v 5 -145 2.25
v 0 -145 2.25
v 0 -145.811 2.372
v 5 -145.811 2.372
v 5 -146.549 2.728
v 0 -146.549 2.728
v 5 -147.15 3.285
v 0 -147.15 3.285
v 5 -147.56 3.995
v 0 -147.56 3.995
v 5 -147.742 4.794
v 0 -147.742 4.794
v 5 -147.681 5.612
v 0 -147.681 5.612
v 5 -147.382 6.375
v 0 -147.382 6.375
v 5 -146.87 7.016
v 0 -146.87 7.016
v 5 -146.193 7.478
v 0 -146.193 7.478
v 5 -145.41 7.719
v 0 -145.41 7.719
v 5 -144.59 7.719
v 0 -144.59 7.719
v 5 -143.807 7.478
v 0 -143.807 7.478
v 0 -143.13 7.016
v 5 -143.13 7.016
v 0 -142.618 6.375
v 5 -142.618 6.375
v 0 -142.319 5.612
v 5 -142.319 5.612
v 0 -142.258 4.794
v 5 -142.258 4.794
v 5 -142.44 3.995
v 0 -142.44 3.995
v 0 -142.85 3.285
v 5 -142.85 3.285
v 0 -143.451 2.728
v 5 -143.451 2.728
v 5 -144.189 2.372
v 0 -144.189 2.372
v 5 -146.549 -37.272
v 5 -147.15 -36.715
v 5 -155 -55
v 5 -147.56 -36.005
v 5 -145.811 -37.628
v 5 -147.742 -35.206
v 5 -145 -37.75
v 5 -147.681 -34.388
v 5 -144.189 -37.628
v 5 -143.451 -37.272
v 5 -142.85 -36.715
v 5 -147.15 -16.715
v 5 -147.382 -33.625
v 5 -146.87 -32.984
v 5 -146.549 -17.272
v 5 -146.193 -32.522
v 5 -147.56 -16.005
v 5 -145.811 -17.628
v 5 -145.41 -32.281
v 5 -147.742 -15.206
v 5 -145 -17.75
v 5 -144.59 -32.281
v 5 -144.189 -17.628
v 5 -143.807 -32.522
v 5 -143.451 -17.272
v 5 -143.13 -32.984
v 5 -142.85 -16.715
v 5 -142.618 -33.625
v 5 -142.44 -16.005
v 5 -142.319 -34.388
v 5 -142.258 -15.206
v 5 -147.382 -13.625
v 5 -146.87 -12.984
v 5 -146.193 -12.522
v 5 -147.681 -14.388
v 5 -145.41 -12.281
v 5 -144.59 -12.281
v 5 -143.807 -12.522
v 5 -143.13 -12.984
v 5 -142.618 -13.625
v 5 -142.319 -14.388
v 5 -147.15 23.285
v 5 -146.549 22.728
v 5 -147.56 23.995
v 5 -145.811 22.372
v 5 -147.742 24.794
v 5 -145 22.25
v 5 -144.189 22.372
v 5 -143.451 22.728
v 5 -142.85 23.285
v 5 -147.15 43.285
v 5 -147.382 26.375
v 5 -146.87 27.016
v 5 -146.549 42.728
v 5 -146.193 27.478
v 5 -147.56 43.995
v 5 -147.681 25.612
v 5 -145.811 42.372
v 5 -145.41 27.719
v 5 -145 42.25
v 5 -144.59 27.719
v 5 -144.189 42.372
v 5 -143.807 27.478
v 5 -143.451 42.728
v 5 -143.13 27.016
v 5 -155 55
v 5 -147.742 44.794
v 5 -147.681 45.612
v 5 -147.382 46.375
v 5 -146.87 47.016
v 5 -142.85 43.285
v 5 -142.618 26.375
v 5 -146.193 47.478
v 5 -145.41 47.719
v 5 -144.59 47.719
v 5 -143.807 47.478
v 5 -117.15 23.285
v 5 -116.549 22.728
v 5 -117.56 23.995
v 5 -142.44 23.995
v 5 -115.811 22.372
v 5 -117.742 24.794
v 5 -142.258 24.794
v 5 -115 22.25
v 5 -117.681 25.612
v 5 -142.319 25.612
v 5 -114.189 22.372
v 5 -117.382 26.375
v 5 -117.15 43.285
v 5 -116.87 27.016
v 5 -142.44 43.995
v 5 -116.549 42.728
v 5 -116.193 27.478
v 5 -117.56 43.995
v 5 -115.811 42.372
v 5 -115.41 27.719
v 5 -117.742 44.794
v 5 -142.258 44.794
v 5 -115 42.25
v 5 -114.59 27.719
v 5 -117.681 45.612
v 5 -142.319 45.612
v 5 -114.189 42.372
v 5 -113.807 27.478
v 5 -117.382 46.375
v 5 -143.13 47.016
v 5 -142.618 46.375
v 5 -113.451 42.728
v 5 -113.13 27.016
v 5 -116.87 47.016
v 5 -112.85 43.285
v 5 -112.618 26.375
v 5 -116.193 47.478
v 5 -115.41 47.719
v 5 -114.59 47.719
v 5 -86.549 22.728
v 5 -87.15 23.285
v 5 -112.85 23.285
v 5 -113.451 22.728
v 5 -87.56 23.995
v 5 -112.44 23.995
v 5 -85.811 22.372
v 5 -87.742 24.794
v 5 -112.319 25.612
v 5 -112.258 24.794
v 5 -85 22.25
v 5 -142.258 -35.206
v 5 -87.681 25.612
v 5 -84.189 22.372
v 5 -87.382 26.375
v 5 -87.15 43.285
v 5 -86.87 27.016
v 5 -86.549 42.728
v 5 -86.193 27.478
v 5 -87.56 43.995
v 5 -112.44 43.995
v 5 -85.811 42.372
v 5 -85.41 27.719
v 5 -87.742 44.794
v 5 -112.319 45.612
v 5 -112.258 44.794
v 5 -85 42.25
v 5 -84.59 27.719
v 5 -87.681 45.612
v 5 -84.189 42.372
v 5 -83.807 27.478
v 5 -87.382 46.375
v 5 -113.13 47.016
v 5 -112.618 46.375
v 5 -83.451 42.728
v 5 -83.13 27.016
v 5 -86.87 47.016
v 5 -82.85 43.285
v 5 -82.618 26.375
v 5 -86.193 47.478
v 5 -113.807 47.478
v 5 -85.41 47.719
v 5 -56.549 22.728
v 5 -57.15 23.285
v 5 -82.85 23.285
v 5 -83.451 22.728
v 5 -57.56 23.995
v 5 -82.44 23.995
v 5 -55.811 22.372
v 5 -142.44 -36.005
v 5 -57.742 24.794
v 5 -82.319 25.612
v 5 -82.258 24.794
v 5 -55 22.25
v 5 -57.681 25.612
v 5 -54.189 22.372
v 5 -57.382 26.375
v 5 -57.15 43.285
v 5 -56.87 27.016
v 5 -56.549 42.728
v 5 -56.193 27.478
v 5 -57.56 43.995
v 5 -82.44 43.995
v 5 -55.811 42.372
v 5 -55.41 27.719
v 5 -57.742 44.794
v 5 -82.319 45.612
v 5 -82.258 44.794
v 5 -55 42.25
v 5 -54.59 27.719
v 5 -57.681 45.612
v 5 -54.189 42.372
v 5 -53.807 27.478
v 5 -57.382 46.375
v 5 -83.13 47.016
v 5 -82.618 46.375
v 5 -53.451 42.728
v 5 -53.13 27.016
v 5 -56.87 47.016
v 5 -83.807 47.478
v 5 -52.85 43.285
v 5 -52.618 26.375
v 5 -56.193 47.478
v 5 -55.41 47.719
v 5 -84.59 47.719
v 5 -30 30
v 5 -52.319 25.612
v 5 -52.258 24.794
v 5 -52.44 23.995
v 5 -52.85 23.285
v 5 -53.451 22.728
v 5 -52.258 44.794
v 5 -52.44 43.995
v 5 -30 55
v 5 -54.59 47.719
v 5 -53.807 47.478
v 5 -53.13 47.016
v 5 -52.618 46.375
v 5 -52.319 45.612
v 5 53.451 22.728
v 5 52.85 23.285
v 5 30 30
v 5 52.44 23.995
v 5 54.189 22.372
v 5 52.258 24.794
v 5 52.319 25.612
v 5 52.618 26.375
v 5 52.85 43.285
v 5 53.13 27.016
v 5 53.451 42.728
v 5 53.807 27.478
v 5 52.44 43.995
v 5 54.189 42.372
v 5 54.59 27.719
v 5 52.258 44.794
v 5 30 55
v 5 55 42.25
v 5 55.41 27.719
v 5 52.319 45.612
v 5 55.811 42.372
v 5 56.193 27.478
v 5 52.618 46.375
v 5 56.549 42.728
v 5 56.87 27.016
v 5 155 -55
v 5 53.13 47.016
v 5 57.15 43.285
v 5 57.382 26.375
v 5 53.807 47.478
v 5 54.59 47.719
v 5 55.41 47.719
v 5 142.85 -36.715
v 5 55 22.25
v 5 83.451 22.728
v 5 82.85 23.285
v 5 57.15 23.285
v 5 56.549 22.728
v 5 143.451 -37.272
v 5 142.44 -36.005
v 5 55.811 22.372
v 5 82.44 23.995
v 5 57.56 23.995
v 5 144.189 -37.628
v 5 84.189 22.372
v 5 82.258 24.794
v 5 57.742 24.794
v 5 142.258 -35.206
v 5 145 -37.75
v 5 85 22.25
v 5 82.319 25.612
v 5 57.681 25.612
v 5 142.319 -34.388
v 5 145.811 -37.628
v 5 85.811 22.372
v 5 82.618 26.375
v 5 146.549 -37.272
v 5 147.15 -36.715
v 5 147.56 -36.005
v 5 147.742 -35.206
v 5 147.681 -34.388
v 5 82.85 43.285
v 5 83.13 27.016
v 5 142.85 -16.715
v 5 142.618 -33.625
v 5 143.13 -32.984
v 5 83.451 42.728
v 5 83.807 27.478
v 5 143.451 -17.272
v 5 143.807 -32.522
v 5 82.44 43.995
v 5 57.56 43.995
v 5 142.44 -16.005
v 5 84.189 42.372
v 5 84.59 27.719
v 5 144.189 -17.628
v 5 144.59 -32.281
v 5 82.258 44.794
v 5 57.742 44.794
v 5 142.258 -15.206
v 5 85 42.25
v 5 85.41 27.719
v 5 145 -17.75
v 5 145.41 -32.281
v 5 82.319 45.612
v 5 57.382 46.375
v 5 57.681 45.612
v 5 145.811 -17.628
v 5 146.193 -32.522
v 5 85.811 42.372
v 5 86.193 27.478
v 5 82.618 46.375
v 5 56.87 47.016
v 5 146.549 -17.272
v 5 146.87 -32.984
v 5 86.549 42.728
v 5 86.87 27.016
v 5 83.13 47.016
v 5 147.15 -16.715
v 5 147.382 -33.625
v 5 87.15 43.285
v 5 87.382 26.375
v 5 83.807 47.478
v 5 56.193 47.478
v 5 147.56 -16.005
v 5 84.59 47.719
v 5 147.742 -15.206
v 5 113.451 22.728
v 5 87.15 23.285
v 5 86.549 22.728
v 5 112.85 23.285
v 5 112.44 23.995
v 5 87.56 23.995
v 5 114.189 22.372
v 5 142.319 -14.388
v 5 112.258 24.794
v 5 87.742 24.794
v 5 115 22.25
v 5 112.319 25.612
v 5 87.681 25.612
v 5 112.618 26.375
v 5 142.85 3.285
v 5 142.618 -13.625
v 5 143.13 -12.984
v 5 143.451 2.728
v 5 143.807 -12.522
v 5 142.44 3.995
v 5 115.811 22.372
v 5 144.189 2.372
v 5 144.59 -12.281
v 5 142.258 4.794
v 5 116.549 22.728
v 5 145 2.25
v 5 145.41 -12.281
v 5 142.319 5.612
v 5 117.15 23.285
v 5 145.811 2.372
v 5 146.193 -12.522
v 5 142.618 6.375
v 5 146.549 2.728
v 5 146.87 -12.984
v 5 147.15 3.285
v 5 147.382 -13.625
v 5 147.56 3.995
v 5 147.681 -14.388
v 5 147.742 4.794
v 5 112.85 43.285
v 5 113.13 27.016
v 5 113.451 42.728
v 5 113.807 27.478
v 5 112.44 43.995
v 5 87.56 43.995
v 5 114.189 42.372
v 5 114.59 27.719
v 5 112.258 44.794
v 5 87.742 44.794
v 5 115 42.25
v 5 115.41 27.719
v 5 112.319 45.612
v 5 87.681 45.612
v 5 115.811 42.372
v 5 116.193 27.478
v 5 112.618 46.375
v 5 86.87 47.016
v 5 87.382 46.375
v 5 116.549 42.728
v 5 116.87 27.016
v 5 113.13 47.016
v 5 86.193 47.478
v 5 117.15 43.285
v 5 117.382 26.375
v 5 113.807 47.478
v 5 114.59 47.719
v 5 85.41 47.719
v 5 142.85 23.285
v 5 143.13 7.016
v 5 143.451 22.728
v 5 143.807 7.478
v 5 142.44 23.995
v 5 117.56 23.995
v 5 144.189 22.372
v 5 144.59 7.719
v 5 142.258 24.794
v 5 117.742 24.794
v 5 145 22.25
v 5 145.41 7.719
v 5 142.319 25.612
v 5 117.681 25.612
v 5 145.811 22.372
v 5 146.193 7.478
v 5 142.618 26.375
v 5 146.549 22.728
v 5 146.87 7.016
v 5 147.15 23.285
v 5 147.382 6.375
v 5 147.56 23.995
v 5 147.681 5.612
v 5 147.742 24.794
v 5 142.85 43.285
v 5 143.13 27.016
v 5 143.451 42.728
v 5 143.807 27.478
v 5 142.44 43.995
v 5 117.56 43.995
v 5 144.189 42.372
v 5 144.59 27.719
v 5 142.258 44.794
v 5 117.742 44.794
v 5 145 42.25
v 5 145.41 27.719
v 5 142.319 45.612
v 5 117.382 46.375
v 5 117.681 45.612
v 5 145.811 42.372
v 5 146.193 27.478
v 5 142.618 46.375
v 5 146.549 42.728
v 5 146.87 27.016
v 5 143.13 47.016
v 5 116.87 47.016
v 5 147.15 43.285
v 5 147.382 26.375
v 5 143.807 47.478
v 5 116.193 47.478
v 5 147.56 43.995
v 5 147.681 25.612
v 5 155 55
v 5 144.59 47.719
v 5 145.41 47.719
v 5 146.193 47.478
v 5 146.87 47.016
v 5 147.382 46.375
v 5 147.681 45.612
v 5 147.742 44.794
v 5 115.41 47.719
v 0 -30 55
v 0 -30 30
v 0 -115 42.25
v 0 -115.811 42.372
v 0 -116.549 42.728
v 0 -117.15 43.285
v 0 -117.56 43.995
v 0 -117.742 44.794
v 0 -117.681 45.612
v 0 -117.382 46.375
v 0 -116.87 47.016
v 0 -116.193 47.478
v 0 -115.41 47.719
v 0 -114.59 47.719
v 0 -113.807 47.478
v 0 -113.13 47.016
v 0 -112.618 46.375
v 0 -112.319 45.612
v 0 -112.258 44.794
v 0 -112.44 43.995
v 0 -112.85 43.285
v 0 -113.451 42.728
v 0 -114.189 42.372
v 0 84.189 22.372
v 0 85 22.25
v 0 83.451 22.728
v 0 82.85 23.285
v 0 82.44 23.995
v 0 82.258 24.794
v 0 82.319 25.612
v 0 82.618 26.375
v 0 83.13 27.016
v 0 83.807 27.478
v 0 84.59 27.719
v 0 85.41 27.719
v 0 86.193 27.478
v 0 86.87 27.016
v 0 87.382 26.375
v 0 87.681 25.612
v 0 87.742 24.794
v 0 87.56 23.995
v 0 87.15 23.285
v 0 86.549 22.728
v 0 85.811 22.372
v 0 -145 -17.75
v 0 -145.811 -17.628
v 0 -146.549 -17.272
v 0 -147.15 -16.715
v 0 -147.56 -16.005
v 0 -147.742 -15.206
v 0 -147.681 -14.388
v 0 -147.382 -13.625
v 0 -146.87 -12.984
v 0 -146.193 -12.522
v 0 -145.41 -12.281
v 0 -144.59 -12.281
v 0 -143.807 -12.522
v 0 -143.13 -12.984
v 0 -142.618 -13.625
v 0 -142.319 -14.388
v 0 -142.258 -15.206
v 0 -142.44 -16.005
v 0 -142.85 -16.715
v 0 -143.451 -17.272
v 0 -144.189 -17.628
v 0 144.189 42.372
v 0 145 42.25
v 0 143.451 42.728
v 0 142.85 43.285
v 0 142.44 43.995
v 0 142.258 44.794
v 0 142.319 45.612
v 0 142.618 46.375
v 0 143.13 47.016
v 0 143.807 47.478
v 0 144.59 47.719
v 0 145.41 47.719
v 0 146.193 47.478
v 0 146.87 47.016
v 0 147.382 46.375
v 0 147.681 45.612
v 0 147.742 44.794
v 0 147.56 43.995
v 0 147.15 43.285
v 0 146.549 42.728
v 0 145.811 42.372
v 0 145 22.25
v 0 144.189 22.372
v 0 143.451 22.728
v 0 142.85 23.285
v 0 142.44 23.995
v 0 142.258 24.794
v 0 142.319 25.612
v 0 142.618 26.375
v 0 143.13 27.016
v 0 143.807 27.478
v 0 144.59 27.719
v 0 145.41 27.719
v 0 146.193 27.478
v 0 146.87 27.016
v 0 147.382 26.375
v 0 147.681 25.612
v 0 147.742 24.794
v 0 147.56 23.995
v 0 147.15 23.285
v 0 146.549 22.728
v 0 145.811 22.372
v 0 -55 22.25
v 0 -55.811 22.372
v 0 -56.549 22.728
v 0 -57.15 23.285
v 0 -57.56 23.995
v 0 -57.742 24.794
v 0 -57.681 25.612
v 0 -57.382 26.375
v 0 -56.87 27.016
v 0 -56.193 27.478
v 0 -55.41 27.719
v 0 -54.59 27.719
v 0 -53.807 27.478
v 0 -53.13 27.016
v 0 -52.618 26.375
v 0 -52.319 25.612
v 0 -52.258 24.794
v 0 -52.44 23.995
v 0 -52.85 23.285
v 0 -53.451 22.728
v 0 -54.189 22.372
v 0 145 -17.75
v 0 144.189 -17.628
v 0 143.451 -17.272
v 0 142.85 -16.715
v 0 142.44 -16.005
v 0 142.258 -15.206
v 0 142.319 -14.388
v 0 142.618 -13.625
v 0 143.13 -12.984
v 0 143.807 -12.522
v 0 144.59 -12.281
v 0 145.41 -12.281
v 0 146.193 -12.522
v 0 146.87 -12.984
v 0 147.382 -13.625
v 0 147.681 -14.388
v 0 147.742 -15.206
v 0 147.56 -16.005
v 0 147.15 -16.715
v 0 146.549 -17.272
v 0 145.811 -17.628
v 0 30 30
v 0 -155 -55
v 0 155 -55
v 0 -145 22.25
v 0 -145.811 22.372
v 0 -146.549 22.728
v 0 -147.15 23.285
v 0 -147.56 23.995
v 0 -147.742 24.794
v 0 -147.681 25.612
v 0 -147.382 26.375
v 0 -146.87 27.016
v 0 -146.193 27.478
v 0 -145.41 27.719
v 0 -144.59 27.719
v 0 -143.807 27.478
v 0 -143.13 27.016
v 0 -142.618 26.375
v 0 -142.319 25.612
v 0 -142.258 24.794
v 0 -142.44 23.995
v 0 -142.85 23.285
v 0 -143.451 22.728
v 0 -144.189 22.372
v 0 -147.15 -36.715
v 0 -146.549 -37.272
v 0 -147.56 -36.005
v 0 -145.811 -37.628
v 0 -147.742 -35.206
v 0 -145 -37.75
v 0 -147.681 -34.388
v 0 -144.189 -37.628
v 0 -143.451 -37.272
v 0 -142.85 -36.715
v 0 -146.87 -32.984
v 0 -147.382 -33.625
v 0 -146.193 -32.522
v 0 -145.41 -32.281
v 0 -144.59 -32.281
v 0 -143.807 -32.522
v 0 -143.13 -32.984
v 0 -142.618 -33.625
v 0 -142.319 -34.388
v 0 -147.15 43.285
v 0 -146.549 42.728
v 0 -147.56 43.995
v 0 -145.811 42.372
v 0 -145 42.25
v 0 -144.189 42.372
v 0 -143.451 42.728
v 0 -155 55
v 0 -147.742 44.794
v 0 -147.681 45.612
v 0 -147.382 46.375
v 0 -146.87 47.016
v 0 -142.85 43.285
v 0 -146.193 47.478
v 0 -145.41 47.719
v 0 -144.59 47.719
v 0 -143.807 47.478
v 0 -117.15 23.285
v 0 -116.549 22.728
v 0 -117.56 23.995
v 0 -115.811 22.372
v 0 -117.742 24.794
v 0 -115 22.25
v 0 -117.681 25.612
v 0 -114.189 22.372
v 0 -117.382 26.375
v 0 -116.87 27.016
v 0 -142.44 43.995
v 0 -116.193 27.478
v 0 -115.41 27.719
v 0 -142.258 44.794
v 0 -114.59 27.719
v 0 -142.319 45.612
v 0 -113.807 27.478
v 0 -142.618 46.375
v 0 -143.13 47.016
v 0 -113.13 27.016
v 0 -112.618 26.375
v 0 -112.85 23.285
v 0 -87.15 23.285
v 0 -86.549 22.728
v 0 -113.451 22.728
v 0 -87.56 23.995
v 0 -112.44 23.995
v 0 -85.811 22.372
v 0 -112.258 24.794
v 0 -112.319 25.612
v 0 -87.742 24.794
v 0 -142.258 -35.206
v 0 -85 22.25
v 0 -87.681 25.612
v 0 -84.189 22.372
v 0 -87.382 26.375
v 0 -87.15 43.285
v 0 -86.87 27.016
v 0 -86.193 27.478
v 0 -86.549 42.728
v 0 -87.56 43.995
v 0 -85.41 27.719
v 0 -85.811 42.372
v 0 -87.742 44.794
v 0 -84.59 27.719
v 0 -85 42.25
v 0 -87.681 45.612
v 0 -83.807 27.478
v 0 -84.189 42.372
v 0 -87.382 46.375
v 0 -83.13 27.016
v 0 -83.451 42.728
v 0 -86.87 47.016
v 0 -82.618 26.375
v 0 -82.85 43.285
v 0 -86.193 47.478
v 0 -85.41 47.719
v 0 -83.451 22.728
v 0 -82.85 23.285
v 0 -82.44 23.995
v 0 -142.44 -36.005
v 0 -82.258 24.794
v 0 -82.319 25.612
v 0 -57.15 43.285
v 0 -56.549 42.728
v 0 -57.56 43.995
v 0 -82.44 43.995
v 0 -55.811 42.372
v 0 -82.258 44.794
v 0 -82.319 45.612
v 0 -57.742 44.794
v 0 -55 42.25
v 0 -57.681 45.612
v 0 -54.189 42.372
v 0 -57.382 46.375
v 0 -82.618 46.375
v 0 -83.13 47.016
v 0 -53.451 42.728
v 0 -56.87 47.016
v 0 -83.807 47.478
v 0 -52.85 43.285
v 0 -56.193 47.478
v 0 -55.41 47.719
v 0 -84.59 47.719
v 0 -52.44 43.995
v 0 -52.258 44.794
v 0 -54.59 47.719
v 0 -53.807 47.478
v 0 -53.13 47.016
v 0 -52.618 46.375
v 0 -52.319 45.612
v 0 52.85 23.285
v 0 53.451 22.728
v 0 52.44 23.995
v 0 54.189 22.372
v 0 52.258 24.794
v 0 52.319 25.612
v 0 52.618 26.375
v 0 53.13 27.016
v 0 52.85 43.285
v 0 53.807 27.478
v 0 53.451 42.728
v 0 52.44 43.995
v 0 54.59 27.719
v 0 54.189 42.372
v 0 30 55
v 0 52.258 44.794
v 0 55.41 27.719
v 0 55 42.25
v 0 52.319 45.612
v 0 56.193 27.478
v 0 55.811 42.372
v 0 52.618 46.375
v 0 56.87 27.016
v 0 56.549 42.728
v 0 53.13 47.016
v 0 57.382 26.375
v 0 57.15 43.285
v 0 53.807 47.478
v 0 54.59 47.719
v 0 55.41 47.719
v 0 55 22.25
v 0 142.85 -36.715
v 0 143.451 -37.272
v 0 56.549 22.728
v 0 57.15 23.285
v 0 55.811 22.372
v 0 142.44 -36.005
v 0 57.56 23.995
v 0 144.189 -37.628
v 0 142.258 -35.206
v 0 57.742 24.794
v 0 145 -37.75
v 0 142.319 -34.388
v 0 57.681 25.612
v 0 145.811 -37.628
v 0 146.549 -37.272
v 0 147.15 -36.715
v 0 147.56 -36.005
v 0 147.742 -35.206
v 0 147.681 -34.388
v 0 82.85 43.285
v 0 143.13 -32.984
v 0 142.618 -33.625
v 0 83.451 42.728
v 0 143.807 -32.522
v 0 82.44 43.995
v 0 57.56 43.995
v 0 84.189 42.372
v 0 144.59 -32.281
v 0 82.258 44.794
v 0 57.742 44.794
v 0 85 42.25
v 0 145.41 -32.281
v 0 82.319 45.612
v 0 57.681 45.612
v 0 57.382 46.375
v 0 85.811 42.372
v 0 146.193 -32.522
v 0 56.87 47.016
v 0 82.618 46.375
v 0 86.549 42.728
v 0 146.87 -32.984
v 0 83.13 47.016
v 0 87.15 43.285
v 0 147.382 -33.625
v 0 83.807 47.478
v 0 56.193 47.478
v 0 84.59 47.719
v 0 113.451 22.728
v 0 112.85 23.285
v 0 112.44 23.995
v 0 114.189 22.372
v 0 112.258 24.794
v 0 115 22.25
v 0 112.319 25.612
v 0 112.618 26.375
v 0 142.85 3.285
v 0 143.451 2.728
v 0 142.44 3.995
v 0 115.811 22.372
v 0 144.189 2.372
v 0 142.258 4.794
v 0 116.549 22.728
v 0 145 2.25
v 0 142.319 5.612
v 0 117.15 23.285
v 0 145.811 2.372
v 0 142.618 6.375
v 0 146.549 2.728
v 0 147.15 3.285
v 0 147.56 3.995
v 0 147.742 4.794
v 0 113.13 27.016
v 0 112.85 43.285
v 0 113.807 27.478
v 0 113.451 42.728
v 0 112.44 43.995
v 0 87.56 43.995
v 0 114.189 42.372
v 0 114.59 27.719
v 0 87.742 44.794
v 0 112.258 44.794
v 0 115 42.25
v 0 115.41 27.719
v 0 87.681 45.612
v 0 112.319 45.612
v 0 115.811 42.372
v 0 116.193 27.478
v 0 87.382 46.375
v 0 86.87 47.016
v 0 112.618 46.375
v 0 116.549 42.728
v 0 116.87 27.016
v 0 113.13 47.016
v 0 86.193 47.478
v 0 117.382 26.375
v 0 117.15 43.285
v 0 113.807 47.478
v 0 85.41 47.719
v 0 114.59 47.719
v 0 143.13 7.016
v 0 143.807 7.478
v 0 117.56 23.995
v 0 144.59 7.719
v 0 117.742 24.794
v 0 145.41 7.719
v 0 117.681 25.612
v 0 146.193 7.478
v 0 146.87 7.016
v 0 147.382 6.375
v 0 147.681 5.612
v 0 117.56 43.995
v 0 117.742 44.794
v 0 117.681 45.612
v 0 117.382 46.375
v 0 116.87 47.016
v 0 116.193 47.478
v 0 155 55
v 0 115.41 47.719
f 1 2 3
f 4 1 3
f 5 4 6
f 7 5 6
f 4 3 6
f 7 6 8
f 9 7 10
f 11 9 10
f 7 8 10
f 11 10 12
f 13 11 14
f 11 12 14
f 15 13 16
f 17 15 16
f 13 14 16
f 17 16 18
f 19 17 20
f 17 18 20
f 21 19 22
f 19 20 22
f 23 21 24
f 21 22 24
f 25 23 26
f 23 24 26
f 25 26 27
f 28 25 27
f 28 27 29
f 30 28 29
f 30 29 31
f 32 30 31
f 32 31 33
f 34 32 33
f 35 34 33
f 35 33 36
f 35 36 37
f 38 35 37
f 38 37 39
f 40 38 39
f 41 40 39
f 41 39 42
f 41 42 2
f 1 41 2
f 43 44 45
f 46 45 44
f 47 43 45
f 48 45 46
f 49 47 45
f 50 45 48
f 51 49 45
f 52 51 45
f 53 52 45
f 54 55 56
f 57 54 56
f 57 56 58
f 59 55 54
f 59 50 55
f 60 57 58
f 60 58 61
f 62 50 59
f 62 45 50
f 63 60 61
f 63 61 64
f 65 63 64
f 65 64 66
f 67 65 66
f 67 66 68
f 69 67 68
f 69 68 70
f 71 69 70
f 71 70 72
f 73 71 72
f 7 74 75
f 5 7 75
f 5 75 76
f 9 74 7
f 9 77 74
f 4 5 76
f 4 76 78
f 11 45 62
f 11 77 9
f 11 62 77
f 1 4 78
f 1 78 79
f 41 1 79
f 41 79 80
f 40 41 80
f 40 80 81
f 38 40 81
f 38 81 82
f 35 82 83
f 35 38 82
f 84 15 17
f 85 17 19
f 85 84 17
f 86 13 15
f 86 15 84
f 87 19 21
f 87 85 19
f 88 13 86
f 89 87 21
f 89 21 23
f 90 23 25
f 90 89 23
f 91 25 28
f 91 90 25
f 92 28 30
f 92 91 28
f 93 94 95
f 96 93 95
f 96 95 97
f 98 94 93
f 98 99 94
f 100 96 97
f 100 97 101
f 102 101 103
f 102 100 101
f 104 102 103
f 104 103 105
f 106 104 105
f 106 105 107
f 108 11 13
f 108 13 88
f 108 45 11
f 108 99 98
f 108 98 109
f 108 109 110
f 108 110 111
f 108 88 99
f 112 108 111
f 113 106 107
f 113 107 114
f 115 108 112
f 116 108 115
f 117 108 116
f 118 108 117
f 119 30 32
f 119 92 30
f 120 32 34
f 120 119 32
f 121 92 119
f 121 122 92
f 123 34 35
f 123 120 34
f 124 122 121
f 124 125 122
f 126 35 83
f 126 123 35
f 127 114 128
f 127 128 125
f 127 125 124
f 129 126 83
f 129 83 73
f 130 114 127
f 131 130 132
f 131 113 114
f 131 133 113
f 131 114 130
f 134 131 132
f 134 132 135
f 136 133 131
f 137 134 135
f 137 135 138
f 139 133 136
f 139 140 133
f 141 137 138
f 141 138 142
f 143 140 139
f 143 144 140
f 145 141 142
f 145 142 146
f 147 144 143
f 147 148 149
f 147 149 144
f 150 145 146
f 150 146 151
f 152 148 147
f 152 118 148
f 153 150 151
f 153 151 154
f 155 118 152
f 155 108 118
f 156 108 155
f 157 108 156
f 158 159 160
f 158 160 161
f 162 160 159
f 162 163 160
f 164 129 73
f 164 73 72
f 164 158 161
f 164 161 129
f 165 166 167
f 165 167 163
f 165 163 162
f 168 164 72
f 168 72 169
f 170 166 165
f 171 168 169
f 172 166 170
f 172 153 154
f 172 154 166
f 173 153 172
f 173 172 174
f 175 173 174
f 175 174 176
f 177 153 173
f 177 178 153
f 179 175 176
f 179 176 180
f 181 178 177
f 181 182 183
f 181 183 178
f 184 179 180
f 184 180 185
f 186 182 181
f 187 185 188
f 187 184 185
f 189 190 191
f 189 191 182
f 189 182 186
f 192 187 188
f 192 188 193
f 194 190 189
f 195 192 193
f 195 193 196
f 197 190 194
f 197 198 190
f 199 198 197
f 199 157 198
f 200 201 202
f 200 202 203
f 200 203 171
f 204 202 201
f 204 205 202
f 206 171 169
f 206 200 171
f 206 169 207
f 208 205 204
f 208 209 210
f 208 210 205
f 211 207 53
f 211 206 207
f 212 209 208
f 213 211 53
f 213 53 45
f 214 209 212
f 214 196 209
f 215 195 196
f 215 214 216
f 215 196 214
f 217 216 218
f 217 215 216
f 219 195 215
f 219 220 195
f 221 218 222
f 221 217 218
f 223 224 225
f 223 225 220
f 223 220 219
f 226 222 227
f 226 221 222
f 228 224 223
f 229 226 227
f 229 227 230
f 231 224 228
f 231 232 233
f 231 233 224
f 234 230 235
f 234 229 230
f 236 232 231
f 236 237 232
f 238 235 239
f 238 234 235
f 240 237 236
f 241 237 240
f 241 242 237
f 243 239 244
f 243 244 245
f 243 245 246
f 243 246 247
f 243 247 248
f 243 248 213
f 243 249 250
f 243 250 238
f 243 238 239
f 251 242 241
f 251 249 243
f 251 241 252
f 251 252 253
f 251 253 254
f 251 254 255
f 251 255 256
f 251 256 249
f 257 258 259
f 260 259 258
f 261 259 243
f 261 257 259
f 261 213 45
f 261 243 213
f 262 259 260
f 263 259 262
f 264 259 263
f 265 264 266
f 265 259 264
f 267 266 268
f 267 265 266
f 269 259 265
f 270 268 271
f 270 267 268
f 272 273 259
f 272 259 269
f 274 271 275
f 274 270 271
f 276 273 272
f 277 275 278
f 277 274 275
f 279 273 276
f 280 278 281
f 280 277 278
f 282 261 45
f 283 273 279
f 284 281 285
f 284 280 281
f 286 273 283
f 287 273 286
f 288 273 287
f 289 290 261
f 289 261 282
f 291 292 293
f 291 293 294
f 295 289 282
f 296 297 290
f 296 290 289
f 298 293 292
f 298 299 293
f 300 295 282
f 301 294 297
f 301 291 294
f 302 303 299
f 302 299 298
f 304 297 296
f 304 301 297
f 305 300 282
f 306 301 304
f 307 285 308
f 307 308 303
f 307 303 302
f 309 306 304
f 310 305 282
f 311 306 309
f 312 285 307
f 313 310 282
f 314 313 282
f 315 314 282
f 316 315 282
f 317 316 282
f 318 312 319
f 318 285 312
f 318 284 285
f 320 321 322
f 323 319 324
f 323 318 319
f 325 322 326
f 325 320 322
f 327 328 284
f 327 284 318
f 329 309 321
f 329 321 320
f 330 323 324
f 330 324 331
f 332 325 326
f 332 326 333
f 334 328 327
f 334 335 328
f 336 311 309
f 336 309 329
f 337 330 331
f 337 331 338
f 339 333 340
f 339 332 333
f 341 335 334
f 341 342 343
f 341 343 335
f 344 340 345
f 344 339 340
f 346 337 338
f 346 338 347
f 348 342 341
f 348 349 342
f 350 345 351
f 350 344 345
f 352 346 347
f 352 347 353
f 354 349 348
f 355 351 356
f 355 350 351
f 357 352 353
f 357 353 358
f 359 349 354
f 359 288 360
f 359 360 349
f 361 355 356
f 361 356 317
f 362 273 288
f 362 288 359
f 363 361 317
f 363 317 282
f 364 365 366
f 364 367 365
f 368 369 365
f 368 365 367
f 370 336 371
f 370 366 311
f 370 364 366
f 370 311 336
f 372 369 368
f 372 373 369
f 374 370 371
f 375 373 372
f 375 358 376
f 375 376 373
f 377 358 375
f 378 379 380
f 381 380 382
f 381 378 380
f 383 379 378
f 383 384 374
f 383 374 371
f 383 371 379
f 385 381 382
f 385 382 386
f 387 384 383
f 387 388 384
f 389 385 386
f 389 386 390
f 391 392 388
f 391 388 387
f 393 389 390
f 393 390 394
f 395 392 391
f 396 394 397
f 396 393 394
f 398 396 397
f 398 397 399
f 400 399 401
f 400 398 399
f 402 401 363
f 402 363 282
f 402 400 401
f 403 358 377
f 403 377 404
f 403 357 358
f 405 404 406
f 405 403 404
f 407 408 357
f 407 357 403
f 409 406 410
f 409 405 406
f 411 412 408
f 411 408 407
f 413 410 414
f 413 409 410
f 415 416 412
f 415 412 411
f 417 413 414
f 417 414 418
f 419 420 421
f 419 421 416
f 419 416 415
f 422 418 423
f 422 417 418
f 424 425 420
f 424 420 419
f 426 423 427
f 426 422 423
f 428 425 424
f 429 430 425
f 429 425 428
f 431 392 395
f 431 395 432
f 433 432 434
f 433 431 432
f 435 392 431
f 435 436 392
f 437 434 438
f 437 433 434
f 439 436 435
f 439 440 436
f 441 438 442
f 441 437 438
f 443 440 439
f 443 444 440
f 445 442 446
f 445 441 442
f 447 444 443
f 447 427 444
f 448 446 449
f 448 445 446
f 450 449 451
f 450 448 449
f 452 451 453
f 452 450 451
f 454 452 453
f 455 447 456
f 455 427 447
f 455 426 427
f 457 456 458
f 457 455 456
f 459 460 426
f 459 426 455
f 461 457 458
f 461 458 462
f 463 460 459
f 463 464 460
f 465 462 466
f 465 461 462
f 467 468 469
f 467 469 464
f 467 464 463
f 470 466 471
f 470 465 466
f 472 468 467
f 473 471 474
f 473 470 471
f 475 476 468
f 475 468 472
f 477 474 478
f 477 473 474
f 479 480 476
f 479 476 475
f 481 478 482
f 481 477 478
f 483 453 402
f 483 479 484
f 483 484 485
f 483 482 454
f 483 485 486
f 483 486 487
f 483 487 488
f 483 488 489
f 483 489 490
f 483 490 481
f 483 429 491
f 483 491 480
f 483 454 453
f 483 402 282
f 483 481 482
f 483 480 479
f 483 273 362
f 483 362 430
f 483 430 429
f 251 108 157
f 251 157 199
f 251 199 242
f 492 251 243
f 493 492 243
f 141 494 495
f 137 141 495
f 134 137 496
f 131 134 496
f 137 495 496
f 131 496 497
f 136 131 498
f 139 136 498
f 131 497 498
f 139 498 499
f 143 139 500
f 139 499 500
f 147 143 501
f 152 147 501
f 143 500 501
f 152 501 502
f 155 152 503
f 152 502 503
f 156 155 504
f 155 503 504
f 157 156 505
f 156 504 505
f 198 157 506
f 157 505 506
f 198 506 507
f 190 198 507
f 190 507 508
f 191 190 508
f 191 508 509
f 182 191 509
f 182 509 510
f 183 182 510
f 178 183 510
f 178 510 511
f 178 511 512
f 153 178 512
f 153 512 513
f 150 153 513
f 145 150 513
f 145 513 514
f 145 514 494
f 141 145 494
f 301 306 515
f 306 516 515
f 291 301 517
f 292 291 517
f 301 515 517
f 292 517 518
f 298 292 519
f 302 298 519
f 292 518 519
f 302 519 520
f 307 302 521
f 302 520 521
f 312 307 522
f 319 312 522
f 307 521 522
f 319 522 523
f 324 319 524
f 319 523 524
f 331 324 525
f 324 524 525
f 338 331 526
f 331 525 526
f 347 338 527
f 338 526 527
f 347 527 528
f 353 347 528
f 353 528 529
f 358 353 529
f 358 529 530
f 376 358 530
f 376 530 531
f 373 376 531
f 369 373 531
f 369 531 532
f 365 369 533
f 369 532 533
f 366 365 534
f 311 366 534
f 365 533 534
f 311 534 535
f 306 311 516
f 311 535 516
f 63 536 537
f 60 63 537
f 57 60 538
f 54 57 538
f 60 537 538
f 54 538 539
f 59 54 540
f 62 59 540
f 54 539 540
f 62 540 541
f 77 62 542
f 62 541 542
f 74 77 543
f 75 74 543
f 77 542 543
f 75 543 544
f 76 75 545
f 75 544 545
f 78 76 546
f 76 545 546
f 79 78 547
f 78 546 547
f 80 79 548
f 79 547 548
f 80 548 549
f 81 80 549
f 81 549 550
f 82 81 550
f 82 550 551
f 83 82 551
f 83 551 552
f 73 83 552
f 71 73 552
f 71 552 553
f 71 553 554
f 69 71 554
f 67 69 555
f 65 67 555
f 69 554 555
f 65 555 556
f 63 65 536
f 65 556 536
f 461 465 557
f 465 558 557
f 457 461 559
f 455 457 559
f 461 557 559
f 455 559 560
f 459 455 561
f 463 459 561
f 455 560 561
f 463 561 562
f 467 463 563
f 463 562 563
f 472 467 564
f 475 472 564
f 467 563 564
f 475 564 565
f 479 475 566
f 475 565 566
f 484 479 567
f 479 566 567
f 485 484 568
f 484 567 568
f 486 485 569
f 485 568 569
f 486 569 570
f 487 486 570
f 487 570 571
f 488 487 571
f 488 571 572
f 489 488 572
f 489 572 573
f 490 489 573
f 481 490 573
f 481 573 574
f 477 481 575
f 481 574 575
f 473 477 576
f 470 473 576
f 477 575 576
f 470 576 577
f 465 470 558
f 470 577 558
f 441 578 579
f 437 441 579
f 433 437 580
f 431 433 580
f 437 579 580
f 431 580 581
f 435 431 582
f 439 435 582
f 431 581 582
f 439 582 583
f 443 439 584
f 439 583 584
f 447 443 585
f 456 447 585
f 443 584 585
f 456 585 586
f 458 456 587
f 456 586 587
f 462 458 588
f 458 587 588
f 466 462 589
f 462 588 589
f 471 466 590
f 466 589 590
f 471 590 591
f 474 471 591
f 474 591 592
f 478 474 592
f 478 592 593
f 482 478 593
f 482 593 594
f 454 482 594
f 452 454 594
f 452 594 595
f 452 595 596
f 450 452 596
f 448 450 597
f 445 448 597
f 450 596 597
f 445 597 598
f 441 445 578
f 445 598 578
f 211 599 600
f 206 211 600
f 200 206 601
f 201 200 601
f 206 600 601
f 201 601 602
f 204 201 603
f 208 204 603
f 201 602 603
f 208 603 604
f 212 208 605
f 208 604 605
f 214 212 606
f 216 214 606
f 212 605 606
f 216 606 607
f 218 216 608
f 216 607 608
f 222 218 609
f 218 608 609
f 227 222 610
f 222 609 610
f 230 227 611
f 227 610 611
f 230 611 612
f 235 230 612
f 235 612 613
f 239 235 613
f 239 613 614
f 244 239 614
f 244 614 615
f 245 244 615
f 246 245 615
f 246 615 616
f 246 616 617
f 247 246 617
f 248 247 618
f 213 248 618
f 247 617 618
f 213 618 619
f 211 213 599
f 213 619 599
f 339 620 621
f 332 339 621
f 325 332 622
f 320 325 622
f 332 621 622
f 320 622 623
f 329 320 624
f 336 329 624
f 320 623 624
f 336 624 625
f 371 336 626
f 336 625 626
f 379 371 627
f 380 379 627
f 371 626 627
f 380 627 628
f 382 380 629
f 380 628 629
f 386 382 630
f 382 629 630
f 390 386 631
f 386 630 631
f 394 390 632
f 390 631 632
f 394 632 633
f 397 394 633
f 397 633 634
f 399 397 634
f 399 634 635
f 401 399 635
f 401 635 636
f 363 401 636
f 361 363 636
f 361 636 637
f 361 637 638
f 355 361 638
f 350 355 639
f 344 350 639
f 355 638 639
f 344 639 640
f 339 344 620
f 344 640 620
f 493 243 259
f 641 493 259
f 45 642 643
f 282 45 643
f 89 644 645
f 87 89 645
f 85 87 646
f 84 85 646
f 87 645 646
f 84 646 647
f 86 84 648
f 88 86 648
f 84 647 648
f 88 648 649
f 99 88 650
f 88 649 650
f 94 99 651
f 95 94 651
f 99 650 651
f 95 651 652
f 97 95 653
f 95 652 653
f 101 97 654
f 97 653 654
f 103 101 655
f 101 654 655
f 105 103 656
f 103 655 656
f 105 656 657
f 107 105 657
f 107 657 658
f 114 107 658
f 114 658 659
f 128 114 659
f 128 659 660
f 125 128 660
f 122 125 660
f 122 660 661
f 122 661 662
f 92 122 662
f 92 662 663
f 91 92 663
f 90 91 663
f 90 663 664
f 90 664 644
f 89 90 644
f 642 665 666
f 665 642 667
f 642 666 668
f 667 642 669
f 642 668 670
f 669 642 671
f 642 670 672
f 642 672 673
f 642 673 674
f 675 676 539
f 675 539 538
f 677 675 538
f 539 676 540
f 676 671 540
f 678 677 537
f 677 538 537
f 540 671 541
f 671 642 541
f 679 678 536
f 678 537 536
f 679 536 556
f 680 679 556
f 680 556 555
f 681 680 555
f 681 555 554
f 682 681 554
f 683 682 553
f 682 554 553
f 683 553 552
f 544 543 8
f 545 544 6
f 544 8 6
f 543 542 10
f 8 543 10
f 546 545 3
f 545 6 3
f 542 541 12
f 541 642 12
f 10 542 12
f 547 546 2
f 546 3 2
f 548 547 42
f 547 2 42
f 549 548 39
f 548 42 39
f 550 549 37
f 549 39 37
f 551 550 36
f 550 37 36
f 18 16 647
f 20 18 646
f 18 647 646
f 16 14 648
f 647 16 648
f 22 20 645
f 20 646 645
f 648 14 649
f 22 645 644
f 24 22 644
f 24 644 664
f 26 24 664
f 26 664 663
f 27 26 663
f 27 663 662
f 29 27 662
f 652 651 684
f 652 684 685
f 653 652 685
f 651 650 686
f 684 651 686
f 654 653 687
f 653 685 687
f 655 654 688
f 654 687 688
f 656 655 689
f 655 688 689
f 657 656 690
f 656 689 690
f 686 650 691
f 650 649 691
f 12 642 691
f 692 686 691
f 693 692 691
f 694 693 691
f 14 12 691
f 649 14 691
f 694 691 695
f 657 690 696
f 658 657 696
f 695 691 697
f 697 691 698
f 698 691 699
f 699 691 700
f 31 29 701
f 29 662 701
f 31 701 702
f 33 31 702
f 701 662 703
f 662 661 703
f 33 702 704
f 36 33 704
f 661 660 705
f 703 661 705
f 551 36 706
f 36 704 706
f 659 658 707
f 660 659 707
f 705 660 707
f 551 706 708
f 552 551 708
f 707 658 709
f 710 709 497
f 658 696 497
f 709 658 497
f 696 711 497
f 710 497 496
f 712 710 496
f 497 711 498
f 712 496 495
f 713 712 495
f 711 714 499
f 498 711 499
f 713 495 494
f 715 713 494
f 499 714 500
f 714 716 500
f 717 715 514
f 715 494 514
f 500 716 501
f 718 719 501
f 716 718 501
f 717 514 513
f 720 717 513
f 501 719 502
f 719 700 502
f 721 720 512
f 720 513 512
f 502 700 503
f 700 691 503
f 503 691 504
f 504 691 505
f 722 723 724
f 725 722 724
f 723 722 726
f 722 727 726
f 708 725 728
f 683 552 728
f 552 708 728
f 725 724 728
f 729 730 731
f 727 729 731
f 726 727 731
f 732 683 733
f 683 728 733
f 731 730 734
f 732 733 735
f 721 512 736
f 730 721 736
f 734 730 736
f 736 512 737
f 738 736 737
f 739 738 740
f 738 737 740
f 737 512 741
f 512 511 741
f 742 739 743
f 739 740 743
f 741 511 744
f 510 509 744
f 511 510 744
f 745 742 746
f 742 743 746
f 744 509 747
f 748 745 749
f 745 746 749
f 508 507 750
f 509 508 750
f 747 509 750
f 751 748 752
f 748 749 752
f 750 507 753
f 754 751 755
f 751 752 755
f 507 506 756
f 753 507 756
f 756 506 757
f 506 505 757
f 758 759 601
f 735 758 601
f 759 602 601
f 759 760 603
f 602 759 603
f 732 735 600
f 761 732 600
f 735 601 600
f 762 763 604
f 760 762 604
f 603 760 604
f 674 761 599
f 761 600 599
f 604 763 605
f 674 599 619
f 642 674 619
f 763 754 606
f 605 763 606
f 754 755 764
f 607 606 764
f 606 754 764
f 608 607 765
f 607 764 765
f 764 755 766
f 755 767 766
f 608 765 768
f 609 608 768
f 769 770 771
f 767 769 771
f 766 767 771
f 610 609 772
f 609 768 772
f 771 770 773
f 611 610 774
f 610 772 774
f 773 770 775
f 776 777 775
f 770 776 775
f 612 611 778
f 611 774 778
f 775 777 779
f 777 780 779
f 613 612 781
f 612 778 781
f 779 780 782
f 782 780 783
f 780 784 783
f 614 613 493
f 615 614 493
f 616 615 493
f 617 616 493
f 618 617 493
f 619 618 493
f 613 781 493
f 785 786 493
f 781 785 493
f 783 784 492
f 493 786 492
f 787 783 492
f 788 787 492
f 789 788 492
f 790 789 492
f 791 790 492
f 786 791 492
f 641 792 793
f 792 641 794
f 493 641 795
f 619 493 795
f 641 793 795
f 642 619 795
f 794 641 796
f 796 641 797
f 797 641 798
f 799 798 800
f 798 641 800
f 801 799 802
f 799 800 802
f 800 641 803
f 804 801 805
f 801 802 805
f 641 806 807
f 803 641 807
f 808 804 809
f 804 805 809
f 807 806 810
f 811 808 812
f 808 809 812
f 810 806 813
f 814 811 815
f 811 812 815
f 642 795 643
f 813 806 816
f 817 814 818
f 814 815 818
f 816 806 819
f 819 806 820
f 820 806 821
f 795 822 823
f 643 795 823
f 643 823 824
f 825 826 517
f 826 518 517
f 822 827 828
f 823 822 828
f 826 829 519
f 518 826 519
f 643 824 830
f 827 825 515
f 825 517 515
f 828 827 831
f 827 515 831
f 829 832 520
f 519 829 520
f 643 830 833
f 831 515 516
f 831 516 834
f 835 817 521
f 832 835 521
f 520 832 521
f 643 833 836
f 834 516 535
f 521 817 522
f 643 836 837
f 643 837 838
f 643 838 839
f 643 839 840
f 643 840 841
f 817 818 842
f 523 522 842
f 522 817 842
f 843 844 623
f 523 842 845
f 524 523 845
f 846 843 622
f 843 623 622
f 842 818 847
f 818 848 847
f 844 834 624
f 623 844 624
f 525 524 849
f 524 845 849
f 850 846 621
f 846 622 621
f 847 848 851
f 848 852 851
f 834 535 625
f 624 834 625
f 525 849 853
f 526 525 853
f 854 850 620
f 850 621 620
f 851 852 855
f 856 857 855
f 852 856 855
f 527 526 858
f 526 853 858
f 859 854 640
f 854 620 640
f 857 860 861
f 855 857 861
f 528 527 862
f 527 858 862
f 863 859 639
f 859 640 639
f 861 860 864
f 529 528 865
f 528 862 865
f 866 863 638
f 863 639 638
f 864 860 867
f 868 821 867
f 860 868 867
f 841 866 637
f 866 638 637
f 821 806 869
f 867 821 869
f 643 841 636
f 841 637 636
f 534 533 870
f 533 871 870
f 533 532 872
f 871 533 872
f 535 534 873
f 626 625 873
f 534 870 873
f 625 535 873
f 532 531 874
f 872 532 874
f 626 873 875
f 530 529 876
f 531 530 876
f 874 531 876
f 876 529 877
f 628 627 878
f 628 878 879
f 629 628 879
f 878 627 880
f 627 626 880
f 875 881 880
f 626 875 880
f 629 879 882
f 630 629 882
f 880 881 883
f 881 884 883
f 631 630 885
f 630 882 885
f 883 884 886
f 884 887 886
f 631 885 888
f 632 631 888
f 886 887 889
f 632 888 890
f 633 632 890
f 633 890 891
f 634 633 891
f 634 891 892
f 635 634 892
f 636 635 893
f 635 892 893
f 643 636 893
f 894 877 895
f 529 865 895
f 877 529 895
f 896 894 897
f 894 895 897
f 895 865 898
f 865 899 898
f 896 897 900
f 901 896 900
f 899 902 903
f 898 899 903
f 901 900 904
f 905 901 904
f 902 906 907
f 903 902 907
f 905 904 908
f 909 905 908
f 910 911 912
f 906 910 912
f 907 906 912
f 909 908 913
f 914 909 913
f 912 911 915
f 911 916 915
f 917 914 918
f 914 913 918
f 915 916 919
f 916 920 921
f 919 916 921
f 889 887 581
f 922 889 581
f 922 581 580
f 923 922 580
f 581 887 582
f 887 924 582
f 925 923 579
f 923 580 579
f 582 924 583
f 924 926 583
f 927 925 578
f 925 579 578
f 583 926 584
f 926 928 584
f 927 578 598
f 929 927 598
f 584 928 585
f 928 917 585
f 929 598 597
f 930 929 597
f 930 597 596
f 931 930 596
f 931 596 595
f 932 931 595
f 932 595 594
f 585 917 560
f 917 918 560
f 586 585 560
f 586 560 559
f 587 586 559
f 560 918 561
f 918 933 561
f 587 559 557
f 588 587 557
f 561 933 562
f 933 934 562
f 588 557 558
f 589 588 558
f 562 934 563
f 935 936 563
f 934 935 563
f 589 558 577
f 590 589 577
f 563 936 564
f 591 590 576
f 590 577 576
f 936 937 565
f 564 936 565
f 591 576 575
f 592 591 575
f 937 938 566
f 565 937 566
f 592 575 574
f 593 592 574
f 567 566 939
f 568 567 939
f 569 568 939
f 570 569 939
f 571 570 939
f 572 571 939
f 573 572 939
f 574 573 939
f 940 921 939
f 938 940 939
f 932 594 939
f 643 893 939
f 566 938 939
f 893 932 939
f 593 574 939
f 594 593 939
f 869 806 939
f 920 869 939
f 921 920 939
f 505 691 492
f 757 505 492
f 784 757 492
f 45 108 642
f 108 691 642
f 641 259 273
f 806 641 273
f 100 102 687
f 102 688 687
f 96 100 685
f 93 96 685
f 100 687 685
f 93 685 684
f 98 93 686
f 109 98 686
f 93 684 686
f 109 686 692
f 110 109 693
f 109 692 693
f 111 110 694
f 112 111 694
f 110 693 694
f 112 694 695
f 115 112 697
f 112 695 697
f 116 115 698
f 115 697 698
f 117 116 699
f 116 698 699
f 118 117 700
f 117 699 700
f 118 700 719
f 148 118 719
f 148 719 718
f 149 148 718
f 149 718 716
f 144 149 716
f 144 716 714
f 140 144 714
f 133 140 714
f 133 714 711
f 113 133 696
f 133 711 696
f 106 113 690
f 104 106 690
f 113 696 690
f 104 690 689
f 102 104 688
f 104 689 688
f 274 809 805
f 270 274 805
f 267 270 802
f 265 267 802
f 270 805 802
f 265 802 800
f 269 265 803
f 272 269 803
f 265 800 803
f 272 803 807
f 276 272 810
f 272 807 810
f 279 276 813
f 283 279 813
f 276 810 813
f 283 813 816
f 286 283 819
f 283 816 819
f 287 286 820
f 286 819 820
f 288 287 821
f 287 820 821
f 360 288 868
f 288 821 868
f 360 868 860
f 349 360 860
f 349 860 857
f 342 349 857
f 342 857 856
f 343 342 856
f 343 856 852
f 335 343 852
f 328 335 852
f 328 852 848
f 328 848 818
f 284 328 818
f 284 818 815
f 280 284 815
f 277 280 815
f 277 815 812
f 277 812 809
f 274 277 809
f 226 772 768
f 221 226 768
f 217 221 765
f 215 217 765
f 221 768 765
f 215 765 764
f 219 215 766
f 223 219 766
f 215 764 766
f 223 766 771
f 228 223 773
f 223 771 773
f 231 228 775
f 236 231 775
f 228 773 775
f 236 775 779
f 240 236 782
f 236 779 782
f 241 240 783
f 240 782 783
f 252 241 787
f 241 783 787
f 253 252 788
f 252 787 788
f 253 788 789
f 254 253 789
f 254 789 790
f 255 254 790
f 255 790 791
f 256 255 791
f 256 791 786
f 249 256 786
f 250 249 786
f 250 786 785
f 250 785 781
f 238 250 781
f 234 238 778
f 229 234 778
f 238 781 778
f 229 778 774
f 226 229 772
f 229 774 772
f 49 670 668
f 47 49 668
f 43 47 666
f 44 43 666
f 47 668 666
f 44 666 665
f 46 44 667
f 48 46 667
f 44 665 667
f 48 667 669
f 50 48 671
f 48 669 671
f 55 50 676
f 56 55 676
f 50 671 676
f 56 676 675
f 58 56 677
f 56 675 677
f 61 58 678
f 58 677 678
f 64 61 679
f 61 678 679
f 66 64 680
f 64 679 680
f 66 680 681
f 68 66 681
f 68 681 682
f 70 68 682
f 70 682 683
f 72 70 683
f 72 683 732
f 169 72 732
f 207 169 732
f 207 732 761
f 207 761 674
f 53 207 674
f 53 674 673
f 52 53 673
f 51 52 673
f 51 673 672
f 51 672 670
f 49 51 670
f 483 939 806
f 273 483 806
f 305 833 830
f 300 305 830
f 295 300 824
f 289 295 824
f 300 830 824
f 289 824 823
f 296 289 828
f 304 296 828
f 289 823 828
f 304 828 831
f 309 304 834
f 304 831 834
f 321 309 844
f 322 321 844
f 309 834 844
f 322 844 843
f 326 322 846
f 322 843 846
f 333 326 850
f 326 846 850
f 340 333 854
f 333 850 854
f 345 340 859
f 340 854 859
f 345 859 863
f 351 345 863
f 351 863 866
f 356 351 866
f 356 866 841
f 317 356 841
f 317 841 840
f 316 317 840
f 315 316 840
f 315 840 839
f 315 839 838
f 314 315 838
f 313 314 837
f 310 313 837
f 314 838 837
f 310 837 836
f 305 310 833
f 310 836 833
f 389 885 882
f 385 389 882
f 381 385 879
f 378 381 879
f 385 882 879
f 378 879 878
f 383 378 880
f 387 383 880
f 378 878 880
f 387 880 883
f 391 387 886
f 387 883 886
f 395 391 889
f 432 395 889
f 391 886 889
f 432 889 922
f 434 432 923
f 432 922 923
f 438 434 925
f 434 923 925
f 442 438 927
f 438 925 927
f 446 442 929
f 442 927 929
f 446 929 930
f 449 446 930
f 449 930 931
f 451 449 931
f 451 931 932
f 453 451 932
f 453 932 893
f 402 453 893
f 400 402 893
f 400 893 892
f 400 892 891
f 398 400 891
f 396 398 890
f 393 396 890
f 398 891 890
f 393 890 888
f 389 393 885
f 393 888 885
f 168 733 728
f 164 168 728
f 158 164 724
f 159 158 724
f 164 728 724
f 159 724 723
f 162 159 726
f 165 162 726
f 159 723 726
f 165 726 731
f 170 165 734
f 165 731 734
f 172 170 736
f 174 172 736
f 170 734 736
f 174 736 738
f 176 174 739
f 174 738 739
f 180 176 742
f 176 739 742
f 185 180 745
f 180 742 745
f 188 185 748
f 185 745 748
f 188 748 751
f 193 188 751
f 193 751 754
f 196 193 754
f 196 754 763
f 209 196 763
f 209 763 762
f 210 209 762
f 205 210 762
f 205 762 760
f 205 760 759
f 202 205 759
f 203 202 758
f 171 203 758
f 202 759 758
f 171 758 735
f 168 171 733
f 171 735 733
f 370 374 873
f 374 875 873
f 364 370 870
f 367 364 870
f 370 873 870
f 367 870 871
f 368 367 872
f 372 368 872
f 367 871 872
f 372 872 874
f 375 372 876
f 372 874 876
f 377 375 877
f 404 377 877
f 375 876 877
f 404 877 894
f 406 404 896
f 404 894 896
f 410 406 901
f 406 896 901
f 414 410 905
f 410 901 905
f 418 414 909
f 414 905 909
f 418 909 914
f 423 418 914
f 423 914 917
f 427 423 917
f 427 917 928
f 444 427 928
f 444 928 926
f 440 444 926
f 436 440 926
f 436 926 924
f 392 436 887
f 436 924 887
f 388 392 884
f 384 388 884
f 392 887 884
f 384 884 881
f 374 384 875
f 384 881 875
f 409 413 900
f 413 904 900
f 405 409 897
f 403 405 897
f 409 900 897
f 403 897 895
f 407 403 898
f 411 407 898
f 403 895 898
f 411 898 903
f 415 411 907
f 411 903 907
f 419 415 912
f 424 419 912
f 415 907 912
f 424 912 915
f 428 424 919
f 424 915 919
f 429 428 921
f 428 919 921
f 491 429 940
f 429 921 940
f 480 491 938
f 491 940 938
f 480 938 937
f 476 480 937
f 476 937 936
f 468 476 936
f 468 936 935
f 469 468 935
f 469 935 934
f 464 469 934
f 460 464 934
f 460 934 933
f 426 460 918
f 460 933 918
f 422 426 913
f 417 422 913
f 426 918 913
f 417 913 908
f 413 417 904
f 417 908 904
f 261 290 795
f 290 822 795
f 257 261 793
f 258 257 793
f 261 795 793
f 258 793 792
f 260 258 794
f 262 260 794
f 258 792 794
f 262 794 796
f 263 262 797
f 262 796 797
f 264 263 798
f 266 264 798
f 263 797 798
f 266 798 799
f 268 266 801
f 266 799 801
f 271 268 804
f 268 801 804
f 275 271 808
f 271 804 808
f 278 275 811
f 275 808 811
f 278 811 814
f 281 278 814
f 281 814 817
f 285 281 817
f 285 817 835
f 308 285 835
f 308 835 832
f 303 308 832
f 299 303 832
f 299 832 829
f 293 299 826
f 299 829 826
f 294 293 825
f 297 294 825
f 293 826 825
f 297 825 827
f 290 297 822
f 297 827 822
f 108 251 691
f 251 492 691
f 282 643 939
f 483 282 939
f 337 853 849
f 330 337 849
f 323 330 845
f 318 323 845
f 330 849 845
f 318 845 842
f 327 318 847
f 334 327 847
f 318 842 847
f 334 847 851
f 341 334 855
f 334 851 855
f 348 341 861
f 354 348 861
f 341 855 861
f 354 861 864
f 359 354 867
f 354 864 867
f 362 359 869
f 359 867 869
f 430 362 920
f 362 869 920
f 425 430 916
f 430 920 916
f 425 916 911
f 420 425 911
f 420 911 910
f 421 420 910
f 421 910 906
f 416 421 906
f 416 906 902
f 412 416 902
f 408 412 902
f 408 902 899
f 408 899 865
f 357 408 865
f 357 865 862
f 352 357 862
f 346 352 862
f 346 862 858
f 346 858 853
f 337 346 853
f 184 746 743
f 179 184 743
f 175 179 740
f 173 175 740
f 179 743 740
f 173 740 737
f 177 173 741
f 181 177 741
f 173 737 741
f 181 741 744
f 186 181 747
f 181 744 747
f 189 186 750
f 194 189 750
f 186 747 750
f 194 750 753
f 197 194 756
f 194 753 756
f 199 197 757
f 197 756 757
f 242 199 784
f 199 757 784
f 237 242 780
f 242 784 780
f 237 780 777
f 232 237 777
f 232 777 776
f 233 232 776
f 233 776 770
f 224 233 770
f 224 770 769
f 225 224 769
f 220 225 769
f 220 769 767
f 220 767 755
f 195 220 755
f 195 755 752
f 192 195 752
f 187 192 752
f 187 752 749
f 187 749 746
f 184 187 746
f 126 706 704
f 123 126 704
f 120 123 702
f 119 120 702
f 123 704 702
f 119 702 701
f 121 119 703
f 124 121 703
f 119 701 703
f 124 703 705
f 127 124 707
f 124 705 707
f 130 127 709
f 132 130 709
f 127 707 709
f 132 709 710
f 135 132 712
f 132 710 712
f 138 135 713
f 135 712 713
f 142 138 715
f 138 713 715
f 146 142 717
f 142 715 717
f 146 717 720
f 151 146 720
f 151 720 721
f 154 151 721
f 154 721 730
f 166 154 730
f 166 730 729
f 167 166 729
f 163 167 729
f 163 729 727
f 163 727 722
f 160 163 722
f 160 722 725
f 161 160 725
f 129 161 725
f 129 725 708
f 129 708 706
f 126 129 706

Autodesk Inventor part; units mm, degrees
ref_plane "YZ Plane" through (0, 0, 0) normal (1, 0, 0) x (0, 1, 0)
ref_plane "XZ Plane" through (0, 0, 0) normal (0, 1, 0) x (-1, 0, 0)
ref_plane "XY Plane" through (0, 0, 0) normal (0, 0, 1) x (1, 0, 0)
sketch "Skizze1" plane through (0, 0, 0) normal (1, 0, 0) x (0, 1, 0)
  line L0 (-155, -55) -> (155, -55)
  line L1 (155, -55) -> (155, 55)
  line L2 (155, 55) -> (-155, 55)
  line L3 (-155, 55) -> (-155, -55)
  line L4 (-155, -55) -> (155, 55) construction
  line L5 (155, -55) -> (-155, 55) construction
  point P0 (0, 0)
  dimension "d43" = 310
  dimension "d44" = 110
extrude "Grundlörper" add sketch "Skizze1" along normal blind 5
sketch "Skizze5" plane through (5, 0, 0) normal (1, 0, 0) x (0, 0, -1)
  line L0 (-55, -155) -> (55, -155) construction
  line L1 (-55, 155) -> (-55, -155) construction
  line L2 (55, 155) -> (-55, 155) construction
  line L3 (-91, 0) -> (91, 0) construction
  line L4 (0, -217) -> (0, 217) construction
  line L5 (-55, -30) -> (-30, -30)
  line L6 (-30, -30) -> (-30, 30)
  line L7 (-30, 30) -> (-55, 30)
  line L8 (-55, -30) -> (-55, 30)
  point P0 (0, 0)
  dimension "d50" = 60
  dimension "d51" = 25
extrude "Aussschnitt" cut sketch "Skizze5" against normal through all
sketch "Skizze7" plane through (5, 0, 0) normal (1, 0, 0) x (0, 0, -1)
  line L0 (-77, 0) -> (77, 0) projected
  line L1 (-55, -145) -> (55, -145) construction
  line L2 (55, -155) -> (55, 155) construction
  line L3 (-55, -155) -> (55, -155) construction
  line L4 (-55, -30) -> (-55, -155) construction
  line L5 (-55, 145) -> (55, 145) construction
  point P0 (0, 0)
  point P1 (-45, -145)
  point P2 (-25, -145)
  point P3 (-5, -145)
  point P4 (15, -145)
  point P5 (35, -145)
  point P6 (-45, -115)
  point P7 (-45, -85)
  point P8 (-45, -55)
  point P9 (-25, -145)
  point P10 (-25, -115)
  point P11 (-25, -85)
  point P12 (-25, -55)
  point P13 (-45, 145)
  point P14 (-25, 145)
  point P15 (-5, 145)
  point P16 (15, 145)
  point P17 (35, 145)
  point P18 (-45, 115)
  point P19 (-45, 85)
  point P20 (-45, 55)
  point P21 (-25, 145)
  point P22 (-25, 115)
  point P23 (-25, 85)
  point P24 (-25, 55)
  dimension "d104" = 10
  dimension "d105" = 10
  dimension "d108" = 20
  dimension "d115" = 30
  dimension "d118" = 20
hole "Bohrung4" at (5, -145, 45) at (5, -145, 25) at (5, -145, 5) at (5, -145, -15) at (5, -145, -35) at (5, -115, 45) at (5, -85, 45) at (5, -55, 45) at (5, -115, 25) at (5, -85, 25) at (5, -55, 25) at (5, 55, 25) at (5, 85, 25) at (5, 115, 25) at (5, 145, 25) at (5, 55, 45) at (5, 85, 45) at (5, 115, 45) at (5, 145, -35) at (5, 145, -15) at (5, 145, 5) at (5, 145, 45) direction (-1, 0, 0) diameter 5.5 end through all
properties part number "200-40-BOGIE-CONNECTOR-06" material "Aluminium 6061"
